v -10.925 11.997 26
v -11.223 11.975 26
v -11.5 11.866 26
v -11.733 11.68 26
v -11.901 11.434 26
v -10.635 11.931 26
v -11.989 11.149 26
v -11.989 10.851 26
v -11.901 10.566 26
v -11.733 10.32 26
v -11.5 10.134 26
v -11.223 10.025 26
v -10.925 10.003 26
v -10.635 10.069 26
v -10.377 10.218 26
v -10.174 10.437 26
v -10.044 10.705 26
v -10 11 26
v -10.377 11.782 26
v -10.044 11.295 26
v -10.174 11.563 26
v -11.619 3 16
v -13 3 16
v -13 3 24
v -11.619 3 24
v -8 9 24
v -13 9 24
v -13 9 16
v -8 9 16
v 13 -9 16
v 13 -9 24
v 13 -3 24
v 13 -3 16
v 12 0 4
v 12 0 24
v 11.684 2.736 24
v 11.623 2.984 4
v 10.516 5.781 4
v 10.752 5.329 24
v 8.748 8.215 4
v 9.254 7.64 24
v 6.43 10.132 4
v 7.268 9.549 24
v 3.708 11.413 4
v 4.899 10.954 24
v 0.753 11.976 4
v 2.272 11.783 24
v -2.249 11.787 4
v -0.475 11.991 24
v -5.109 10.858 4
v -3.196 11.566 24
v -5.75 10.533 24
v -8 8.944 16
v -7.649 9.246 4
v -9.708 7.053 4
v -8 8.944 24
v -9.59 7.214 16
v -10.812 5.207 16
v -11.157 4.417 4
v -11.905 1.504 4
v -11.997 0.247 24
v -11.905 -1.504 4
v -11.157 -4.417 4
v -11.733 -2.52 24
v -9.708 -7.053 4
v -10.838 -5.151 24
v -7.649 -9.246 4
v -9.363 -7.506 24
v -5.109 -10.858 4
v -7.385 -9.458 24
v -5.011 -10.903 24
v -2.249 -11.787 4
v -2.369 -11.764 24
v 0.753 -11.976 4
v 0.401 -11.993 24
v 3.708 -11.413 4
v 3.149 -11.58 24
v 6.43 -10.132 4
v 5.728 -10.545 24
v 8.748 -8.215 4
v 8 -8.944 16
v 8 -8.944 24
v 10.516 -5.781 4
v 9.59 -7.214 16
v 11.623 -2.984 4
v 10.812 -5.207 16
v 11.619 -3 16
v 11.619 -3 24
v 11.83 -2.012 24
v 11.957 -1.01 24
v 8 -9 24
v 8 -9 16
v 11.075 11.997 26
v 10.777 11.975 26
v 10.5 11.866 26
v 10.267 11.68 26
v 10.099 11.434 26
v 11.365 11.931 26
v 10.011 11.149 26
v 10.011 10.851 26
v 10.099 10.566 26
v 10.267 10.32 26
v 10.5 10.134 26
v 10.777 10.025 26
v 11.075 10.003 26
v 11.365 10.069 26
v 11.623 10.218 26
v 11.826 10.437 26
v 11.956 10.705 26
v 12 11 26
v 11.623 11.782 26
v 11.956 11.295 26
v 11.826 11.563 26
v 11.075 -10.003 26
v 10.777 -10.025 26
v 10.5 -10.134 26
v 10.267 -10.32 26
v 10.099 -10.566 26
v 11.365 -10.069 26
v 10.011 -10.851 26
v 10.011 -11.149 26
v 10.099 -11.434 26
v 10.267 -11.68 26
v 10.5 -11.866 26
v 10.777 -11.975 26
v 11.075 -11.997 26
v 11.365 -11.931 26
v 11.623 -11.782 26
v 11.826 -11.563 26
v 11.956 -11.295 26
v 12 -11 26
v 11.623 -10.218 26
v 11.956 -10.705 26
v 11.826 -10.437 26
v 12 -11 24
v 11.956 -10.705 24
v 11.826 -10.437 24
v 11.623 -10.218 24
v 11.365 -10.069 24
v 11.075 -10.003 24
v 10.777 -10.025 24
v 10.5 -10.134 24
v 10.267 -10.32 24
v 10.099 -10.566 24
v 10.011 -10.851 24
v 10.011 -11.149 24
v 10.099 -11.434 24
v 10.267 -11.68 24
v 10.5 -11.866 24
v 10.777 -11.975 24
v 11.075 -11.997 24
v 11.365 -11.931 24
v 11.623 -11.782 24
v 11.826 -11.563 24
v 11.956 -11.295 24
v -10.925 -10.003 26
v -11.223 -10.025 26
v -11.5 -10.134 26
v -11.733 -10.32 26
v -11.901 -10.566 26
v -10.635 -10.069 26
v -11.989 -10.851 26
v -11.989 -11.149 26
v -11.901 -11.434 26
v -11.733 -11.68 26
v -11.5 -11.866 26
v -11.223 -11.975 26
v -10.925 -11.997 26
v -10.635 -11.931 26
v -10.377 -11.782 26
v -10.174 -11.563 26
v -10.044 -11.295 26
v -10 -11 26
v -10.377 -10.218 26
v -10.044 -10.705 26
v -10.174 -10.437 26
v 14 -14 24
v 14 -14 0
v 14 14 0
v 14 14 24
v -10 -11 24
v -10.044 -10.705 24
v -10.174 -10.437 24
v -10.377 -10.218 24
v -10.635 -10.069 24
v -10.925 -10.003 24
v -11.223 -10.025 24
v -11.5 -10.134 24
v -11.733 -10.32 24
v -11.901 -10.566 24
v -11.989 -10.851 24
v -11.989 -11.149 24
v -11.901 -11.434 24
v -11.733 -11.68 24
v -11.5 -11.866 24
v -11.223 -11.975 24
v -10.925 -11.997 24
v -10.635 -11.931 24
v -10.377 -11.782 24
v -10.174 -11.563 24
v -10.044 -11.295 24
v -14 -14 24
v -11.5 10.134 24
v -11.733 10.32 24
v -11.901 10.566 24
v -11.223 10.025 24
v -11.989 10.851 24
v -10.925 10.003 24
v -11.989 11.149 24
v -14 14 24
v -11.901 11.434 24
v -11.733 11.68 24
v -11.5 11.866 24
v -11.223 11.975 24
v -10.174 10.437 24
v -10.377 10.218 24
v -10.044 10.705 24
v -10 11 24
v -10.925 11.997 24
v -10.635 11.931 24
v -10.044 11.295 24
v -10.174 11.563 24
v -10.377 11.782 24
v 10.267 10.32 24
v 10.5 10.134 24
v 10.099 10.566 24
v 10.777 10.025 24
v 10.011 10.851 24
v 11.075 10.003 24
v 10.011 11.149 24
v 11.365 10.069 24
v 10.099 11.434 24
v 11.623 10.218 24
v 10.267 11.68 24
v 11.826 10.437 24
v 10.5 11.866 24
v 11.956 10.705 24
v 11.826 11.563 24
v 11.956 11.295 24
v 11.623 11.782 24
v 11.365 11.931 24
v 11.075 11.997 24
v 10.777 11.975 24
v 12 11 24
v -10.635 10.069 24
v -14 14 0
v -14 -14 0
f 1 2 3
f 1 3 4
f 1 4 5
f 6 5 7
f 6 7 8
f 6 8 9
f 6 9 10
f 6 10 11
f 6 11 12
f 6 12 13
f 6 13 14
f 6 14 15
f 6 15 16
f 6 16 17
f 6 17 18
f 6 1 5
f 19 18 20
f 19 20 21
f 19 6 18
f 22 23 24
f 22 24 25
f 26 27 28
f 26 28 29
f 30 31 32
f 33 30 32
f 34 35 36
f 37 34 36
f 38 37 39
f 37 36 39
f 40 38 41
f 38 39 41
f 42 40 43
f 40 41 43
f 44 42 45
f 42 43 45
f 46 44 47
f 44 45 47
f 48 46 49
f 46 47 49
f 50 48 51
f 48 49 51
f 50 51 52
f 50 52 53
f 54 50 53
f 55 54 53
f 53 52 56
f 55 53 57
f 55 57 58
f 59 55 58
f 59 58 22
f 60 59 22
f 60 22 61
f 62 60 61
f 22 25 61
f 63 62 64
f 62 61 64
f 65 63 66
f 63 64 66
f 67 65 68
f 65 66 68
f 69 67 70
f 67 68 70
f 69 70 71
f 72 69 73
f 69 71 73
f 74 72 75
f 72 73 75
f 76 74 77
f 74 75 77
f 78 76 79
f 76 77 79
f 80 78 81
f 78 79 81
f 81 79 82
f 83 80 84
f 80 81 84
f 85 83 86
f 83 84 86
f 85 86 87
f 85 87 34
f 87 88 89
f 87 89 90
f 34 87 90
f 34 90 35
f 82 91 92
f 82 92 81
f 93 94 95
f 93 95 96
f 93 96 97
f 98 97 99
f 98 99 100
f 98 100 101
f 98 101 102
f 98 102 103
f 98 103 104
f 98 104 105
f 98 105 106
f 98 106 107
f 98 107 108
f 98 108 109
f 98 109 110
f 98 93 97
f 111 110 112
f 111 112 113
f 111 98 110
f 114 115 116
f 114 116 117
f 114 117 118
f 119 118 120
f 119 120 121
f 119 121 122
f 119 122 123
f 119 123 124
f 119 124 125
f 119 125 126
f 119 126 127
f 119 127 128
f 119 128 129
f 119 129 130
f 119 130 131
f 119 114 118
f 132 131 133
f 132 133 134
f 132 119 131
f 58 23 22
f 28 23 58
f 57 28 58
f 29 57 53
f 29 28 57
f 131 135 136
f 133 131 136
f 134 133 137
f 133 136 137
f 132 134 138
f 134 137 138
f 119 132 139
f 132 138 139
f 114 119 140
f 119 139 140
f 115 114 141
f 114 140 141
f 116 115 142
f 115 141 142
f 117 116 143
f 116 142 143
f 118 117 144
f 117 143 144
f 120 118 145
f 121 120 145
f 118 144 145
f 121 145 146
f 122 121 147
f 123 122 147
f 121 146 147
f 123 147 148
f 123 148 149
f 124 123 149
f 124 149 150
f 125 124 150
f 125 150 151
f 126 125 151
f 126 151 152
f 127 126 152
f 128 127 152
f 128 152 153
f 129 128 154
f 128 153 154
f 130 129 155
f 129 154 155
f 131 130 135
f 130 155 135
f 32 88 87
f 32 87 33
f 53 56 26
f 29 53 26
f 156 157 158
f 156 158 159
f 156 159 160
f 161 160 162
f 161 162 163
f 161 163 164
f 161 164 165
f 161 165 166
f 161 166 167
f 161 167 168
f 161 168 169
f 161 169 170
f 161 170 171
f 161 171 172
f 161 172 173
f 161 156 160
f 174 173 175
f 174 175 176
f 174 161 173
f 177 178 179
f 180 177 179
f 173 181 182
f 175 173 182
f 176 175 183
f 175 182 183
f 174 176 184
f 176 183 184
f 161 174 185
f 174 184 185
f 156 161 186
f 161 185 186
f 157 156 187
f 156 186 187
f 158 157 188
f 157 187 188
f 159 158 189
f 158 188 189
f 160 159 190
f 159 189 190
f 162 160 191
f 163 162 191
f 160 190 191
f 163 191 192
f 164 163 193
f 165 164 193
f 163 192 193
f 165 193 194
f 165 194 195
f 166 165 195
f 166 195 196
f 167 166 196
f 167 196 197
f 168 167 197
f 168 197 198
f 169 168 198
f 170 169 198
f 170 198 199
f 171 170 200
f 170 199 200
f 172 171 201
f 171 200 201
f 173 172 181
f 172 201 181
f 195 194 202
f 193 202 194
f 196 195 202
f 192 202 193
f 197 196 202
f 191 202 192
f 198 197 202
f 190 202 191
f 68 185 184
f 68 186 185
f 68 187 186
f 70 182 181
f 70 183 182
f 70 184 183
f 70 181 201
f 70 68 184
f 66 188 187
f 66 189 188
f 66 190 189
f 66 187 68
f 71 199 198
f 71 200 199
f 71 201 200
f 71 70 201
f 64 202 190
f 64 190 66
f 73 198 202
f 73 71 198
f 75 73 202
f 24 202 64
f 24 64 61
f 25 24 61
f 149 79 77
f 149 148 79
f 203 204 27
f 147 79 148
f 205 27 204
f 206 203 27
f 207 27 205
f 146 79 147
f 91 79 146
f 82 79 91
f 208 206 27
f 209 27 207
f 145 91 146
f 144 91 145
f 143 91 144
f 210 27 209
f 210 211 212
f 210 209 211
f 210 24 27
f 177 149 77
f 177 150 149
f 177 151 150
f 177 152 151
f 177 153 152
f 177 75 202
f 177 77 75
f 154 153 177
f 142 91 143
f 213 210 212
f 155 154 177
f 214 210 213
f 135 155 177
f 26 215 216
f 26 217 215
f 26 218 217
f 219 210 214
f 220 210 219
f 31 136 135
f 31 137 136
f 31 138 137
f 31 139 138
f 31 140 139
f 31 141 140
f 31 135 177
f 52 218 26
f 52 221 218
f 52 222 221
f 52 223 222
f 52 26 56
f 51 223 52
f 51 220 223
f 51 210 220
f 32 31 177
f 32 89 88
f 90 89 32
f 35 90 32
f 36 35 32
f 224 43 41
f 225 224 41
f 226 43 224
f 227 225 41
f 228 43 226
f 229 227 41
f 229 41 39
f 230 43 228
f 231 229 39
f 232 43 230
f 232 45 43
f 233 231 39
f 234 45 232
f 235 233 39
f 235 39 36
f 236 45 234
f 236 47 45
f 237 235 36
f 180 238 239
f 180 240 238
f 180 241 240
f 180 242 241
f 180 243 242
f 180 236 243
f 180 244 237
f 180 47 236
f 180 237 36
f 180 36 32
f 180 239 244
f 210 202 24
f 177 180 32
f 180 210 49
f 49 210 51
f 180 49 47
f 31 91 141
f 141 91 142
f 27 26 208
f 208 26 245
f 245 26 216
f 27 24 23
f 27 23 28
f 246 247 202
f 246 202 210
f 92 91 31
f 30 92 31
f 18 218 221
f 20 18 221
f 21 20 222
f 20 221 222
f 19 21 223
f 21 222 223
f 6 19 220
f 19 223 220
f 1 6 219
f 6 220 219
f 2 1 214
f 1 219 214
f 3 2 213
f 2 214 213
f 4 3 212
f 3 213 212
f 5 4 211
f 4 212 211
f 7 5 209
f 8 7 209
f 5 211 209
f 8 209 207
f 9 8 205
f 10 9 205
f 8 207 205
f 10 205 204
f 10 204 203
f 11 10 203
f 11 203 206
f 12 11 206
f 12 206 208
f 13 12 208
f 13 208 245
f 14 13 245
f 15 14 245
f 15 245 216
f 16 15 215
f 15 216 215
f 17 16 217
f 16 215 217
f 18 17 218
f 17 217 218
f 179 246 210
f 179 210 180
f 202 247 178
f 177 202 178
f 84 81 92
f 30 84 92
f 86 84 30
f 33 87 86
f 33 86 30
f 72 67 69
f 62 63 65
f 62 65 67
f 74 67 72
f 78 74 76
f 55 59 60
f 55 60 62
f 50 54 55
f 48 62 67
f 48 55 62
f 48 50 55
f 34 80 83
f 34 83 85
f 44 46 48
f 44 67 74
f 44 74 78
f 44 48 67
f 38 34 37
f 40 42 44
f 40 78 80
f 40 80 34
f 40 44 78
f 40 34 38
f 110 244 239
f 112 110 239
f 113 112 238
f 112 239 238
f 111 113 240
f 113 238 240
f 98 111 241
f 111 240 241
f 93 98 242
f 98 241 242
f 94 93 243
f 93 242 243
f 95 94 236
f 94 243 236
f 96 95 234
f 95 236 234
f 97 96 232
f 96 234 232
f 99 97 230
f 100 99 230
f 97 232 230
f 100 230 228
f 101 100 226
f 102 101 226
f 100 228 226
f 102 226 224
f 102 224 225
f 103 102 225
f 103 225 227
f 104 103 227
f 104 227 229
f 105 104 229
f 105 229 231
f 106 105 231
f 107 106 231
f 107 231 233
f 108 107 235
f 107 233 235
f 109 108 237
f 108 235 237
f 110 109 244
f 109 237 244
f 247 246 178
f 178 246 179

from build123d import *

# Parameters (mm, degrees)
F0_W     = 28
F0_H     = 28
F1_DEPTH = 24
F2_R     = 12
F3_DEPTH = 20
F4_R     = 1
F5_DEPTH = 2
F6_W     = 5
F6_H     = 6
F7_DEPTH = 8


with BuildPart() as f1:
    # F0 (on Top) → F1 (new body)
    with BuildSketch(Plane.XY):
        Rectangle(F0_W, F0_H)
    extrude(amount=F1_DEPTH)

    # F2 (on face) → F3 (cut)
    with BuildSketch(Plane.XY.offset(24)):
        Circle(F2_R)
    extrude(amount=-F3_DEPTH, mode=Mode.SUBTRACT)

    # F4 (on face) → F5 (join)
    with BuildSketch(Plane.XY.offset(24)):
        with Locations((-11, 11)):
            Circle(F4_R)
        with Locations((11, 11)):
            Circle(F4_R)
        with Locations((11, -11)):
            Circle(F4_R)
        with Locations((-11, -11)):
            Circle(F4_R)
    extrude(amount=F5_DEPTH)

    # F6 (on face) → F7 (cut)
    with BuildSketch(Plane.XY.offset(24)):
        with Locations((-10.5, 6)):
            Rectangle(F6_W, F6_H)
        with Locations((10.5, -6)):
            Rectangle(F6_W, F6_H)
    extrude(amount=-F7_DEPTH, mode=Mode.SUBTRACT)


solid = f1.part
